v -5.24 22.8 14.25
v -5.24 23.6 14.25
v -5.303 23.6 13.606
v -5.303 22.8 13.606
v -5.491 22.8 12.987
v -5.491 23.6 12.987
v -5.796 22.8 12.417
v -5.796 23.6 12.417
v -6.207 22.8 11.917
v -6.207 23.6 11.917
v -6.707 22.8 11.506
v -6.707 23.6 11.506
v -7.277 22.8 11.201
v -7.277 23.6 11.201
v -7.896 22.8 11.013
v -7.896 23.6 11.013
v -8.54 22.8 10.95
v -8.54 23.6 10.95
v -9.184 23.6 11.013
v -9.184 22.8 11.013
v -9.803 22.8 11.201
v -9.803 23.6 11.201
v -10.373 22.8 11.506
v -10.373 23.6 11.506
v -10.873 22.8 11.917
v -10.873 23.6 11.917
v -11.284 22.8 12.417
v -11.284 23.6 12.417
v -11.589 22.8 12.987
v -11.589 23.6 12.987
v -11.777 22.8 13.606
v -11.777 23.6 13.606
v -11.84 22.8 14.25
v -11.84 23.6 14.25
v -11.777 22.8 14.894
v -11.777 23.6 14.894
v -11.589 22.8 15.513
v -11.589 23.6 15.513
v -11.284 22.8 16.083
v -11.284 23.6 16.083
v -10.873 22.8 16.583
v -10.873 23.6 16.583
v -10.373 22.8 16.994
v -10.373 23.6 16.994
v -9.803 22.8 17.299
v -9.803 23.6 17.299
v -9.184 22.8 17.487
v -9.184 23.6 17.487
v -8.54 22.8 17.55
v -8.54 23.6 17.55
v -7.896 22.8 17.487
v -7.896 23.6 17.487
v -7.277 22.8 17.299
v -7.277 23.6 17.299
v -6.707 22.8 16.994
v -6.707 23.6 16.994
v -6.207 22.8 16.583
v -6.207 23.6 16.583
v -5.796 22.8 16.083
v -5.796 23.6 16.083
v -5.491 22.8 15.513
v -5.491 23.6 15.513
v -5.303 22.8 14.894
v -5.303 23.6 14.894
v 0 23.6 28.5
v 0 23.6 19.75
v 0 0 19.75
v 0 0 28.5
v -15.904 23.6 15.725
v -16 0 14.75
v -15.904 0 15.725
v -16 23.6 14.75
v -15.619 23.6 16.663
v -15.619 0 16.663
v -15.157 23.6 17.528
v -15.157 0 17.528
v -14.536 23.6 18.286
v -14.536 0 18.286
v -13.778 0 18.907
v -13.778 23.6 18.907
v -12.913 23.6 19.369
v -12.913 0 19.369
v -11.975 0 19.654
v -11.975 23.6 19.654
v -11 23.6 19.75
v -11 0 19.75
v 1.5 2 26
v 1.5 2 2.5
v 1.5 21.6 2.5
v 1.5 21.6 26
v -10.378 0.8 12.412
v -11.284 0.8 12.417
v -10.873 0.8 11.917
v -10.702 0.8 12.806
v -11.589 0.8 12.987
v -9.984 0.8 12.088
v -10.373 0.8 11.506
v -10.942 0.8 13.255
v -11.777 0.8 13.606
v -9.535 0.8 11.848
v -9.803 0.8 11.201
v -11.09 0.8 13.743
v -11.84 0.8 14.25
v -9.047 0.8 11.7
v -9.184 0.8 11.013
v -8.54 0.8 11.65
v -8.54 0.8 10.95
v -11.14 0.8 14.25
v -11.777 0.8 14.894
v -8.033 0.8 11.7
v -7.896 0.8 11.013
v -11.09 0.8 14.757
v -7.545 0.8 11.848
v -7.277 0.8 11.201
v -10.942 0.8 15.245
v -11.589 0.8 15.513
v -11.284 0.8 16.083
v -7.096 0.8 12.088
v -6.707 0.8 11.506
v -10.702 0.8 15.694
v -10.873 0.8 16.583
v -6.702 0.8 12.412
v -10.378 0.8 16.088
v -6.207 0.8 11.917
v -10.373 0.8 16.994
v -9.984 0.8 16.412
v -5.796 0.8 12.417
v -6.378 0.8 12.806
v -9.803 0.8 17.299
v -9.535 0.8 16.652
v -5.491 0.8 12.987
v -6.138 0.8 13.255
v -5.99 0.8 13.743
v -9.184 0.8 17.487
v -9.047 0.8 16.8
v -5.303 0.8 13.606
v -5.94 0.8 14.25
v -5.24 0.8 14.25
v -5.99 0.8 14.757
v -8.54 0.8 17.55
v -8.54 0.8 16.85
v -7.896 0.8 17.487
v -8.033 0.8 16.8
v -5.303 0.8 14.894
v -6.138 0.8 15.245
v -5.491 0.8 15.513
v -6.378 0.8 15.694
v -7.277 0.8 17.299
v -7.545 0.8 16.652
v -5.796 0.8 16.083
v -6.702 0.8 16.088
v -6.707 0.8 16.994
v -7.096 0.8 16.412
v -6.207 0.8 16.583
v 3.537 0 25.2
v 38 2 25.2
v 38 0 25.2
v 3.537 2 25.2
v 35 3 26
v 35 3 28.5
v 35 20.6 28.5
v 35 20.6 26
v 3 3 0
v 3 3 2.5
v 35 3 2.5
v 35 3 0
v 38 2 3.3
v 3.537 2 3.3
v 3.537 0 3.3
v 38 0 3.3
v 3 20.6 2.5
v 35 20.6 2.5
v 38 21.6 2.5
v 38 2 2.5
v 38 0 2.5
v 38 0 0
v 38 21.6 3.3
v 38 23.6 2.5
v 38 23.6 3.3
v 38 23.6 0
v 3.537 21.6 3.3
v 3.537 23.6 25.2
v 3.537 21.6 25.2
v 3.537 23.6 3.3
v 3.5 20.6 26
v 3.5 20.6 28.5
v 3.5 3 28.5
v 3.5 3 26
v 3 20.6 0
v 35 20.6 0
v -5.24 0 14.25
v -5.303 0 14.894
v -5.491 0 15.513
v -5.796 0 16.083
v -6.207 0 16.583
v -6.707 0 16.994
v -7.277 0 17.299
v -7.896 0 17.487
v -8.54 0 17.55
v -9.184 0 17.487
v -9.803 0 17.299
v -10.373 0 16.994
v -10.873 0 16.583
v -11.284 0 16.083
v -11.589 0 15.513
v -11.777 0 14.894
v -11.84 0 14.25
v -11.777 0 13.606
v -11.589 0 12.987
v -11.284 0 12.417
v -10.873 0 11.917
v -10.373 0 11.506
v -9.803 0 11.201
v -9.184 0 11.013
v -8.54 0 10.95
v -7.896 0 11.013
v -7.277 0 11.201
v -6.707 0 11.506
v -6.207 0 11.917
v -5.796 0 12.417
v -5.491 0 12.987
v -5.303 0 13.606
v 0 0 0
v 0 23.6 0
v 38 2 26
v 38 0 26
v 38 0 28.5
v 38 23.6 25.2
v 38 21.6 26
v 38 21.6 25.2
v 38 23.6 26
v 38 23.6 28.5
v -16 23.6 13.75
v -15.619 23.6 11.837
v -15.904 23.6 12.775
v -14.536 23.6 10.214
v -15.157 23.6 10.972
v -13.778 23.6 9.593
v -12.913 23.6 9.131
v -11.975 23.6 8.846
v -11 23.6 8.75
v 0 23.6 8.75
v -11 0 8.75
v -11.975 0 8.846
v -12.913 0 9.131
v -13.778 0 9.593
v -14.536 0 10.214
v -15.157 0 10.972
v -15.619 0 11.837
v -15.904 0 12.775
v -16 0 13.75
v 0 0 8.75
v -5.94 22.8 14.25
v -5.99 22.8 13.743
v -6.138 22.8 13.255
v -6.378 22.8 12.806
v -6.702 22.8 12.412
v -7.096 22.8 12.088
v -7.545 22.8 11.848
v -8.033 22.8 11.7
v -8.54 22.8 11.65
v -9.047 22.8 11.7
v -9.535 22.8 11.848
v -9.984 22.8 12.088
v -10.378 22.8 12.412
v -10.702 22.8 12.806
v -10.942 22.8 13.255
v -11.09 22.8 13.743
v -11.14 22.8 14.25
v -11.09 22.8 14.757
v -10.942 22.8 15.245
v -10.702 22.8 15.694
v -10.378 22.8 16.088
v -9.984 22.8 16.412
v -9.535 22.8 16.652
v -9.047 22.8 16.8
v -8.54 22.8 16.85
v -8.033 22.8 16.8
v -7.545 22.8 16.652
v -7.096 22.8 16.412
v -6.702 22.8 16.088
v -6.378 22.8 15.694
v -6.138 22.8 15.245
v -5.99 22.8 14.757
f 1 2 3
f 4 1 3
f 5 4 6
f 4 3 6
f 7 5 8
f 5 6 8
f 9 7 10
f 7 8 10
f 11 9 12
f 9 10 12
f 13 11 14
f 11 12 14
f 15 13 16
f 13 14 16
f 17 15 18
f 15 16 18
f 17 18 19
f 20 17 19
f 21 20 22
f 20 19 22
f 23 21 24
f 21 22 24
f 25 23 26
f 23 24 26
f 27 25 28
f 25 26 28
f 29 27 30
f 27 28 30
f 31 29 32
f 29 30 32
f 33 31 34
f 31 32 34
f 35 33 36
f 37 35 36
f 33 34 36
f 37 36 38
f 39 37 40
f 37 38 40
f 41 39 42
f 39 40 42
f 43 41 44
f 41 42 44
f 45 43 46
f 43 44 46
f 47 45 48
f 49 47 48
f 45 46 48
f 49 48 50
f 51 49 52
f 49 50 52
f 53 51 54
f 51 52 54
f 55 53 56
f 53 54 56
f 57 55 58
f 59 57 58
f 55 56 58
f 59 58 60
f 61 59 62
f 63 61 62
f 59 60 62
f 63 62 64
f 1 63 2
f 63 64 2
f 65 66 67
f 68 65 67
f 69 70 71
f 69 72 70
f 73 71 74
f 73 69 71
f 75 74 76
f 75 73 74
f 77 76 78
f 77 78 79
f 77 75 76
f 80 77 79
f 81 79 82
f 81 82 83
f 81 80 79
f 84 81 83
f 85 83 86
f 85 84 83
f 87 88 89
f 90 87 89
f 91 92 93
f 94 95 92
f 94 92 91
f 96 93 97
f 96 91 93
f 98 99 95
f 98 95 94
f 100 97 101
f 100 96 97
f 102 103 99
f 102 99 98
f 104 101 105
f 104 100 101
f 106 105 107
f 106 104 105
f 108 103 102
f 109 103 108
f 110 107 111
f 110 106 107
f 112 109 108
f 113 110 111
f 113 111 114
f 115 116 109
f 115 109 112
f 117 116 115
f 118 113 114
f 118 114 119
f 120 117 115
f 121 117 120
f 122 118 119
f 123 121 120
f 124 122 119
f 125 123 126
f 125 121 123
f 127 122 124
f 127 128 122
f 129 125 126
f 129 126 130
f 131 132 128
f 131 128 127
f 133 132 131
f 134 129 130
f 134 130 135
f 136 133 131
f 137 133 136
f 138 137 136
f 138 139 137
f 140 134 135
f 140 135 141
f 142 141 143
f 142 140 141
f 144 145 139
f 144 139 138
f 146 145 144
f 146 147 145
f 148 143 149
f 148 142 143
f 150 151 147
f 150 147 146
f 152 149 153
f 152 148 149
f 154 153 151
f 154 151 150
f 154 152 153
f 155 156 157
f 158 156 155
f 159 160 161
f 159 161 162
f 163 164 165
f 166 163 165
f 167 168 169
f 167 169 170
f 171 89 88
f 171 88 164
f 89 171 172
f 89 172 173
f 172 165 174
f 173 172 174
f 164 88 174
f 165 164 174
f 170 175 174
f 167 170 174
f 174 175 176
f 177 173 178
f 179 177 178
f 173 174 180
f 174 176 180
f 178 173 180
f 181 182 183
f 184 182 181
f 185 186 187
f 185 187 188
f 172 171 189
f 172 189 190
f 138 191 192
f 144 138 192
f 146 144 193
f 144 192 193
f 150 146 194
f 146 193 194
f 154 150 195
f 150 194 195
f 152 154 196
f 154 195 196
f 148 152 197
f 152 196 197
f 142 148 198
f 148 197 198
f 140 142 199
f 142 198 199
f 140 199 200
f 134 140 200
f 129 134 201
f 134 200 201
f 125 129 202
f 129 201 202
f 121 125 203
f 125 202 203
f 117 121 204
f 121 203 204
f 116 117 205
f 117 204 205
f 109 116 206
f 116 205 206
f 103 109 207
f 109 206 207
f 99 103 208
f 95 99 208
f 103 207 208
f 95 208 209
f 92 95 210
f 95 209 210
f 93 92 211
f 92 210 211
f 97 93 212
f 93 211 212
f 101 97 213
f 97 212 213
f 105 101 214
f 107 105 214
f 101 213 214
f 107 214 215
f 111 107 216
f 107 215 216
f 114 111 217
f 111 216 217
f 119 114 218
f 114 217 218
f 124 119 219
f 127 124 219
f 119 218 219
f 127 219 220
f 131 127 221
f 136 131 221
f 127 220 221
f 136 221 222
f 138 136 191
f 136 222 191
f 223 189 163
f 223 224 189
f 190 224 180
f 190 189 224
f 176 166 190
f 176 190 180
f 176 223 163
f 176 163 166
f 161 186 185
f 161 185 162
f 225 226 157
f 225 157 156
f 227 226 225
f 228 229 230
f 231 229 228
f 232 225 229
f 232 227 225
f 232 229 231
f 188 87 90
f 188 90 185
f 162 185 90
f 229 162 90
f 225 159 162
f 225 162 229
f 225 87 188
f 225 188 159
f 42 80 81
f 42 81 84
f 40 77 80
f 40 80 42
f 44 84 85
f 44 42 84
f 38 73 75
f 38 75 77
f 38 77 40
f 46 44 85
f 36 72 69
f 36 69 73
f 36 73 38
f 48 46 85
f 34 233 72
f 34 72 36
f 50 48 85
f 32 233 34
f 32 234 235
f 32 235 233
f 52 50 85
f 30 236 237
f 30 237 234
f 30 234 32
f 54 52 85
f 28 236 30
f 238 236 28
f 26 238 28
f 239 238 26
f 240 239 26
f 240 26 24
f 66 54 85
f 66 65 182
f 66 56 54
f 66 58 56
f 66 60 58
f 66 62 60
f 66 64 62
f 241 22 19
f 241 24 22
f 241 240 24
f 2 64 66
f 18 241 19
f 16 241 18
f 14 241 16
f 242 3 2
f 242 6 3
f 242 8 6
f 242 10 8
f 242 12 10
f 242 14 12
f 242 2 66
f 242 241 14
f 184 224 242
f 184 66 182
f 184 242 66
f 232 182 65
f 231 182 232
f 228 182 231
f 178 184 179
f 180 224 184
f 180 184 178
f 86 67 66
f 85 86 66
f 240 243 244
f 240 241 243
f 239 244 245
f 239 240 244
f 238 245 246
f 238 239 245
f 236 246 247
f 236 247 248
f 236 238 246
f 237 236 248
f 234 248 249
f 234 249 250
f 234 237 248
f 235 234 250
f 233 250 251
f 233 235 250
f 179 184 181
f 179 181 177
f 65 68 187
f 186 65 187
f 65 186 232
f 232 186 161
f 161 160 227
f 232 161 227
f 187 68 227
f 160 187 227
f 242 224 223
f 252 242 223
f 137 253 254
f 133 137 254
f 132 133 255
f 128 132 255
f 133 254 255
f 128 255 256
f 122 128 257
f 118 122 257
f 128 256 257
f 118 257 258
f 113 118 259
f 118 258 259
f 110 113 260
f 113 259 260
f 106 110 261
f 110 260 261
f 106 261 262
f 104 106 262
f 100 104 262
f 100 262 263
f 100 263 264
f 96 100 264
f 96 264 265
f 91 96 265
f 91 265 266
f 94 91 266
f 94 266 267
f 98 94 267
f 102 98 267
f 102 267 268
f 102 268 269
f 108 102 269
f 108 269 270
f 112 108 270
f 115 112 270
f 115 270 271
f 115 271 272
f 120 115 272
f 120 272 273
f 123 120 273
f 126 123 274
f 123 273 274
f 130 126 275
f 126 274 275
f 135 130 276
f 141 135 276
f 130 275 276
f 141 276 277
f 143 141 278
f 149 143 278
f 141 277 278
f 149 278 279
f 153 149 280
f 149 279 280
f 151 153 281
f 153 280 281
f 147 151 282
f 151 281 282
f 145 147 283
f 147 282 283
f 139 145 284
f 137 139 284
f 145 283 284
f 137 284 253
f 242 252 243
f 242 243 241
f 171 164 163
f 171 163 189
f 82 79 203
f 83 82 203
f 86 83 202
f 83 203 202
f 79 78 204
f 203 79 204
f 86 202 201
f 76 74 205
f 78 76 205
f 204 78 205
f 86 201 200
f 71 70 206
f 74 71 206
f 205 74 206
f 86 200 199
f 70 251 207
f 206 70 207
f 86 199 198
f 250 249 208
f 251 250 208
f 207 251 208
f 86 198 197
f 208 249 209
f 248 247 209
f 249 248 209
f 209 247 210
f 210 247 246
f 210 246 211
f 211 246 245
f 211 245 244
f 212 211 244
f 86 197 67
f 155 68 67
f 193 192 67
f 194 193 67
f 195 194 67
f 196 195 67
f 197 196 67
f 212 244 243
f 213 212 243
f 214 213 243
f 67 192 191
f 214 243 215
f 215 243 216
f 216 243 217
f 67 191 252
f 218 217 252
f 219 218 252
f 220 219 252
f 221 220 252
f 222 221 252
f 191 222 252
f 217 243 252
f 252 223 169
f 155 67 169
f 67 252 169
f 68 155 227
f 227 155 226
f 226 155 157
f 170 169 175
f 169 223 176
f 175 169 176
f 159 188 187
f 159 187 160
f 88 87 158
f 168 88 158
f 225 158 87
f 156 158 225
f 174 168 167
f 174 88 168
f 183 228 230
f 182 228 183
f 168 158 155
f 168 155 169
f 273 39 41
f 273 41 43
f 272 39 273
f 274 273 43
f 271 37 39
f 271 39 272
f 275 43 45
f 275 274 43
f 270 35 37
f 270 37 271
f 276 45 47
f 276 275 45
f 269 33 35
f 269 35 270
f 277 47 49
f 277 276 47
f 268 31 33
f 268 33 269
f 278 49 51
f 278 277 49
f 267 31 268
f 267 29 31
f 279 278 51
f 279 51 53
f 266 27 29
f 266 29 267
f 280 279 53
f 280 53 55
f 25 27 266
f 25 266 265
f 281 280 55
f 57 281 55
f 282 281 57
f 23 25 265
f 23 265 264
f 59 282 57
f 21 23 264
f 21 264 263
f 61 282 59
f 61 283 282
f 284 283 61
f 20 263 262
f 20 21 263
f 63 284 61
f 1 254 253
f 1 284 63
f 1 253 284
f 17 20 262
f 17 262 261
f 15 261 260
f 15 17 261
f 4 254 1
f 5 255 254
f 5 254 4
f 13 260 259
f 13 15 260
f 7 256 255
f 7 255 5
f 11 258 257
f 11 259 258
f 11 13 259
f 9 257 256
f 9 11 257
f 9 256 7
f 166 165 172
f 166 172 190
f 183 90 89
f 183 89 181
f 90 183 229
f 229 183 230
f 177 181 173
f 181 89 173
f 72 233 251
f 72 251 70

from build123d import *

# Parameters (mm, degrees)
SKETCH2_W            = 38
SKETCH2_H            = 23.6
BOSS_EXTRUDE2_DEPTH  = 2.5
SKETCH3_W            = 35
SKETCH3_H            = 17.6
CUT_EXTRUDE2_DEPTH   = 2.5
SKETCH5_W            = 36.5
SKETCH5_H            = 2
SKETCH5_W_2          = 1.5
SKETCH5_H_2          = 19.6
BOSS_EXTRUDE3_DEPTH  = 26
SKETCH7_W            = 36.5
SKETCH7_H            = 2.5
BOSS_EXTRUDE5_DEPTH  = 1
SKETCH10_W           = 12.597499818
SKETCH10_H           = 2.5
SKETCH10_W_2         = 23.902500182
BOSS_EXTRUDE6_DEPTH  = 1
SKETCH11_W           = 2.5
SKETCH11_H           = 17.6
BOSS_EXTRUDE7_DEPTH  = 2
SKETCH15_W           = 30.589508609
SKETCH15_H           = 23.5
SKETCH15_W_2         = 3.8732763
CUT_EXTRUDE4_DEPTH   = 30
SKETCH16_W           = 3
SKETCH16_H           = 2.5
BOSS_EXTRUDE8_DEPTH  = 20
SKETCH17_W           = 3
SKETCH17_H           = 2.5
BOSS_EXTRUDE9_DEPTH  = 20
SKETCH19_W           = 5.5
SKETCH19_H           = 23.6
BOSS_EXTRUDE10_DEPTH = 16
SKETCH20_R           = 2.6
CUT_EXTRUDE6_DEPTH   = 30
SKETCH21_R           = 3.3
CUT_EXTRUDE7_DEPTH   = 0.8
SKETCH22_R           = 3.3
CUT_EXTRUDE8_DEPTH   = 0.8
FILLET1_R            = 5
FILLET3_R            = 5
SKETCH23_W           = 34.462784909
SKETCH23_H           = 2
BOSS_EXTRUDE11_DEPTH = 0.8
SKETCH24_W           = 34.462784909
SKETCH24_H           = 2
BOSS_EXTRUDE12_DEPTH = 0.8
SKETCH25_W           = 34.462784909
SKETCH25_H           = 2
BOSS_EXTRUDE13_DEPTH = 0.8
SKETCH26_W           = 34.462784909
SKETCH26_H           = 2
BOSS_EXTRUDE14_DEPTH = 0.8


with BuildPart() as part:
    # Sketch2 → Boss-Extrude2 (new body)
    with BuildSketch(Plane.XY):
        with Locations((19, 11.8)):
            Rectangle(SKETCH2_W, SKETCH2_H)
    extrude(amount=BOSS_EXTRUDE2_DEPTH)

    # Sketch3 → Cut-Extrude2 (cut)
    with BuildSketch(Plane.XY.offset(2.5)):
        with Locations((20.5, 11.8)):
            Rectangle(SKETCH3_W, SKETCH3_H)
    extrude(amount=-CUT_EXTRUDE2_DEPTH, mode=Mode.SUBTRACT)

    # Sketch5 → Boss-Extrude3 (add)
    with BuildSketch(Plane.XY.offset(2.5)):
        with Locations((19.75, 22.6)):
            Rectangle(SKETCH5_W, SKETCH5_H)
        with Locations((0.75, 22.6)):
            Rectangle(SKETCH5_W_2, SKETCH5_H)
        with Locations((0.75, 11.8)):
            Rectangle(SKETCH5_W_2, SKETCH5_H_2)
        with Locations((0.75, 1)):
            Rectangle(SKETCH5_W_2, SKETCH5_H)
        with Locations((19.75, 1)):
            Rectangle(SKETCH5_W, SKETCH5_H)
    extrude(amount=BOSS_EXTRUDE3_DEPTH)

    # Sketch7 → Boss-Extrude5 (add)
    with BuildSketch(Plane(origin=(0, 2, 0), x_dir=(1, 0, 0), z_dir=(0, 1, 0))):
        with Locations((19.75, -27.25)):
            Rectangle(SKETCH7_W, SKETCH7_H)
    extrude(amount=BOSS_EXTRUDE5_DEPTH)

    # Sketch10 → Boss-Extrude6 (add)
    with BuildSketch(Plane.XZ.offset(-21.6)):
        with Locations((31.701250091, 27.25)):
            Rectangle(SKETCH10_W, SKETCH10_H)
        with Locations((13.451250091, 27.25)):
            Rectangle(SKETCH10_W_2, SKETCH10_H)
    extrude(amount=BOSS_EXTRUDE6_DEPTH)

    # Sketch11 → Boss-Extrude7 (add)
    with BuildSketch(Plane(origin=(1.5, 0, 0), x_dir=(0, 0, -1), z_dir=(1, 0, 0))):
        with Locations((-27.25, 11.8)):
            Rectangle(SKETCH11_W, SKETCH11_H)
    extrude(amount=BOSS_EXTRUDE7_DEPTH)

    # Sketch15 → Cut-Extrude4 (cut)
    with BuildSketch(Plane(origin=(0, 23.6, 0), x_dir=(1, 0, 0), z_dir=(0, 1, 0))):
        with Locations((18.831969395, -14.25)):
            Rectangle(SKETCH15_W, SKETCH15_H)
        with Locations((36.06336185, -14.25)):
            Rectangle(SKETCH15_W_2, SKETCH15_H)
    extrude(amount=-CUT_EXTRUDE4_DEPTH, mode=Mode.SUBTRACT)

    # Sketch16 → Boss-Extrude8 (add)
    with BuildSketch(Plane(origin=(0, 3, 0), x_dir=(1, 0, 0), z_dir=(0, 1, 0))):
        with Locations((36.5, -1.25)):
            Rectangle(SKETCH16_W, SKETCH16_H)
    extrude(amount=BOSS_EXTRUDE8_DEPTH)

    # Sketch17 → Boss-Extrude9 (add)
    with BuildSketch(Plane(origin=(0, 3, 0), x_dir=(1, 0, 0), z_dir=(0, 1, 0))):
        with Locations((36.5, -27.25)):
            Rectangle(SKETCH17_W, SKETCH17_H)
    extrude(amount=BOSS_EXTRUDE9_DEPTH)

    # Sketch19 → Boss-Extrude10 (add)
    with BuildSketch(Plane.ZY):
        with Locations((17, 11.8)):
            Rectangle(SKETCH19_W, SKETCH19_H)
        with Locations((11.5, 11.8)):
            Rectangle(SKETCH19_W, SKETCH19_H)
    extrude(amount=BOSS_EXTRUDE10_DEPTH)

    # Sketch20 → Cut-Extrude6 (cut)
    with BuildSketch(Plane(origin=(0, 23.6, 0), x_dir=(1, 0, 0), z_dir=(0, 1, 0))):
        with Locations((-8.54, -14.25)):
            Circle(SKETCH20_R)
    extrude(amount=-CUT_EXTRUDE6_DEPTH, mode=Mode.SUBTRACT)

    # Sketch21 → Cut-Extrude7 (cut)
    with BuildSketch(Plane(origin=(0, 23.6, 0), x_dir=(1, 0, 0), z_dir=(0, 1, 0))):
        with Locations((-8.54, -14.25)):
            Circle(SKETCH21_R)
    extrude(amount=-CUT_EXTRUDE7_DEPTH, mode=Mode.SUBTRACT)

    # Sketch22 → Cut-Extrude8 (cut)
    with BuildSketch(Plane.XZ):
        with Locations((-8.54, 14.25)):
            Circle(SKETCH22_R)
    extrude(amount=-CUT_EXTRUDE8_DEPTH, mode=Mode.SUBTRACT)

    # Fillet1
    fillet1_edges = [part.edges().sort_by_distance(p)[0] for p in [
        (-16, 11.8, 8.75),
    ]]
    fillet(fillet1_edges, radius=FILLET1_R)

    # Fillet3
    fillet3_edges = [part.edges().sort_by_distance(p)[0] for p in [
        (-16, 11.8, 19.75),
    ]]
    fillet(fillet3_edges, radius=FILLET3_R)

    # Sketch23 → Boss-Extrude11 (add)
    with BuildSketch(Plane(origin=(0, 0, 26), x_dir=(-1, 0, 0), z_dir=(0, 0, -1))):
        with Locations((-20.768607546, 22.6)):
            Rectangle(SKETCH23_W, SKETCH23_H)
    extrude(amount=BOSS_EXTRUDE11_DEPTH)

    # Sketch24 → Boss-Extrude12 (add)
    with BuildSketch(Plane.XY.offset(2.5)):
        with Locations((20.768607546, 22.6)):
            Rectangle(SKETCH24_W, SKETCH24_H)
    extrude(amount=BOSS_EXTRUDE12_DEPTH)

    # Sketch25 → Boss-Extrude13 (add)
    with BuildSketch(Plane(origin=(0, 0, 26), x_dir=(-1, 0, 0), z_dir=(0, 0, -1))):
        with Locations((-20.768607546, 1)):
            Rectangle(SKETCH25_W, SKETCH25_H)
    extrude(amount=BOSS_EXTRUDE13_DEPTH)

    # Sketch26 → Boss-Extrude14 (add)
    with BuildSketch(Plane.XY.offset(2.5)):
        with Locations((20.768607546, 1)):
            Rectangle(SKETCH26_W, SKETCH26_H)
    extrude(amount=BOSS_EXTRUDE14_DEPTH)


solid = part.part
